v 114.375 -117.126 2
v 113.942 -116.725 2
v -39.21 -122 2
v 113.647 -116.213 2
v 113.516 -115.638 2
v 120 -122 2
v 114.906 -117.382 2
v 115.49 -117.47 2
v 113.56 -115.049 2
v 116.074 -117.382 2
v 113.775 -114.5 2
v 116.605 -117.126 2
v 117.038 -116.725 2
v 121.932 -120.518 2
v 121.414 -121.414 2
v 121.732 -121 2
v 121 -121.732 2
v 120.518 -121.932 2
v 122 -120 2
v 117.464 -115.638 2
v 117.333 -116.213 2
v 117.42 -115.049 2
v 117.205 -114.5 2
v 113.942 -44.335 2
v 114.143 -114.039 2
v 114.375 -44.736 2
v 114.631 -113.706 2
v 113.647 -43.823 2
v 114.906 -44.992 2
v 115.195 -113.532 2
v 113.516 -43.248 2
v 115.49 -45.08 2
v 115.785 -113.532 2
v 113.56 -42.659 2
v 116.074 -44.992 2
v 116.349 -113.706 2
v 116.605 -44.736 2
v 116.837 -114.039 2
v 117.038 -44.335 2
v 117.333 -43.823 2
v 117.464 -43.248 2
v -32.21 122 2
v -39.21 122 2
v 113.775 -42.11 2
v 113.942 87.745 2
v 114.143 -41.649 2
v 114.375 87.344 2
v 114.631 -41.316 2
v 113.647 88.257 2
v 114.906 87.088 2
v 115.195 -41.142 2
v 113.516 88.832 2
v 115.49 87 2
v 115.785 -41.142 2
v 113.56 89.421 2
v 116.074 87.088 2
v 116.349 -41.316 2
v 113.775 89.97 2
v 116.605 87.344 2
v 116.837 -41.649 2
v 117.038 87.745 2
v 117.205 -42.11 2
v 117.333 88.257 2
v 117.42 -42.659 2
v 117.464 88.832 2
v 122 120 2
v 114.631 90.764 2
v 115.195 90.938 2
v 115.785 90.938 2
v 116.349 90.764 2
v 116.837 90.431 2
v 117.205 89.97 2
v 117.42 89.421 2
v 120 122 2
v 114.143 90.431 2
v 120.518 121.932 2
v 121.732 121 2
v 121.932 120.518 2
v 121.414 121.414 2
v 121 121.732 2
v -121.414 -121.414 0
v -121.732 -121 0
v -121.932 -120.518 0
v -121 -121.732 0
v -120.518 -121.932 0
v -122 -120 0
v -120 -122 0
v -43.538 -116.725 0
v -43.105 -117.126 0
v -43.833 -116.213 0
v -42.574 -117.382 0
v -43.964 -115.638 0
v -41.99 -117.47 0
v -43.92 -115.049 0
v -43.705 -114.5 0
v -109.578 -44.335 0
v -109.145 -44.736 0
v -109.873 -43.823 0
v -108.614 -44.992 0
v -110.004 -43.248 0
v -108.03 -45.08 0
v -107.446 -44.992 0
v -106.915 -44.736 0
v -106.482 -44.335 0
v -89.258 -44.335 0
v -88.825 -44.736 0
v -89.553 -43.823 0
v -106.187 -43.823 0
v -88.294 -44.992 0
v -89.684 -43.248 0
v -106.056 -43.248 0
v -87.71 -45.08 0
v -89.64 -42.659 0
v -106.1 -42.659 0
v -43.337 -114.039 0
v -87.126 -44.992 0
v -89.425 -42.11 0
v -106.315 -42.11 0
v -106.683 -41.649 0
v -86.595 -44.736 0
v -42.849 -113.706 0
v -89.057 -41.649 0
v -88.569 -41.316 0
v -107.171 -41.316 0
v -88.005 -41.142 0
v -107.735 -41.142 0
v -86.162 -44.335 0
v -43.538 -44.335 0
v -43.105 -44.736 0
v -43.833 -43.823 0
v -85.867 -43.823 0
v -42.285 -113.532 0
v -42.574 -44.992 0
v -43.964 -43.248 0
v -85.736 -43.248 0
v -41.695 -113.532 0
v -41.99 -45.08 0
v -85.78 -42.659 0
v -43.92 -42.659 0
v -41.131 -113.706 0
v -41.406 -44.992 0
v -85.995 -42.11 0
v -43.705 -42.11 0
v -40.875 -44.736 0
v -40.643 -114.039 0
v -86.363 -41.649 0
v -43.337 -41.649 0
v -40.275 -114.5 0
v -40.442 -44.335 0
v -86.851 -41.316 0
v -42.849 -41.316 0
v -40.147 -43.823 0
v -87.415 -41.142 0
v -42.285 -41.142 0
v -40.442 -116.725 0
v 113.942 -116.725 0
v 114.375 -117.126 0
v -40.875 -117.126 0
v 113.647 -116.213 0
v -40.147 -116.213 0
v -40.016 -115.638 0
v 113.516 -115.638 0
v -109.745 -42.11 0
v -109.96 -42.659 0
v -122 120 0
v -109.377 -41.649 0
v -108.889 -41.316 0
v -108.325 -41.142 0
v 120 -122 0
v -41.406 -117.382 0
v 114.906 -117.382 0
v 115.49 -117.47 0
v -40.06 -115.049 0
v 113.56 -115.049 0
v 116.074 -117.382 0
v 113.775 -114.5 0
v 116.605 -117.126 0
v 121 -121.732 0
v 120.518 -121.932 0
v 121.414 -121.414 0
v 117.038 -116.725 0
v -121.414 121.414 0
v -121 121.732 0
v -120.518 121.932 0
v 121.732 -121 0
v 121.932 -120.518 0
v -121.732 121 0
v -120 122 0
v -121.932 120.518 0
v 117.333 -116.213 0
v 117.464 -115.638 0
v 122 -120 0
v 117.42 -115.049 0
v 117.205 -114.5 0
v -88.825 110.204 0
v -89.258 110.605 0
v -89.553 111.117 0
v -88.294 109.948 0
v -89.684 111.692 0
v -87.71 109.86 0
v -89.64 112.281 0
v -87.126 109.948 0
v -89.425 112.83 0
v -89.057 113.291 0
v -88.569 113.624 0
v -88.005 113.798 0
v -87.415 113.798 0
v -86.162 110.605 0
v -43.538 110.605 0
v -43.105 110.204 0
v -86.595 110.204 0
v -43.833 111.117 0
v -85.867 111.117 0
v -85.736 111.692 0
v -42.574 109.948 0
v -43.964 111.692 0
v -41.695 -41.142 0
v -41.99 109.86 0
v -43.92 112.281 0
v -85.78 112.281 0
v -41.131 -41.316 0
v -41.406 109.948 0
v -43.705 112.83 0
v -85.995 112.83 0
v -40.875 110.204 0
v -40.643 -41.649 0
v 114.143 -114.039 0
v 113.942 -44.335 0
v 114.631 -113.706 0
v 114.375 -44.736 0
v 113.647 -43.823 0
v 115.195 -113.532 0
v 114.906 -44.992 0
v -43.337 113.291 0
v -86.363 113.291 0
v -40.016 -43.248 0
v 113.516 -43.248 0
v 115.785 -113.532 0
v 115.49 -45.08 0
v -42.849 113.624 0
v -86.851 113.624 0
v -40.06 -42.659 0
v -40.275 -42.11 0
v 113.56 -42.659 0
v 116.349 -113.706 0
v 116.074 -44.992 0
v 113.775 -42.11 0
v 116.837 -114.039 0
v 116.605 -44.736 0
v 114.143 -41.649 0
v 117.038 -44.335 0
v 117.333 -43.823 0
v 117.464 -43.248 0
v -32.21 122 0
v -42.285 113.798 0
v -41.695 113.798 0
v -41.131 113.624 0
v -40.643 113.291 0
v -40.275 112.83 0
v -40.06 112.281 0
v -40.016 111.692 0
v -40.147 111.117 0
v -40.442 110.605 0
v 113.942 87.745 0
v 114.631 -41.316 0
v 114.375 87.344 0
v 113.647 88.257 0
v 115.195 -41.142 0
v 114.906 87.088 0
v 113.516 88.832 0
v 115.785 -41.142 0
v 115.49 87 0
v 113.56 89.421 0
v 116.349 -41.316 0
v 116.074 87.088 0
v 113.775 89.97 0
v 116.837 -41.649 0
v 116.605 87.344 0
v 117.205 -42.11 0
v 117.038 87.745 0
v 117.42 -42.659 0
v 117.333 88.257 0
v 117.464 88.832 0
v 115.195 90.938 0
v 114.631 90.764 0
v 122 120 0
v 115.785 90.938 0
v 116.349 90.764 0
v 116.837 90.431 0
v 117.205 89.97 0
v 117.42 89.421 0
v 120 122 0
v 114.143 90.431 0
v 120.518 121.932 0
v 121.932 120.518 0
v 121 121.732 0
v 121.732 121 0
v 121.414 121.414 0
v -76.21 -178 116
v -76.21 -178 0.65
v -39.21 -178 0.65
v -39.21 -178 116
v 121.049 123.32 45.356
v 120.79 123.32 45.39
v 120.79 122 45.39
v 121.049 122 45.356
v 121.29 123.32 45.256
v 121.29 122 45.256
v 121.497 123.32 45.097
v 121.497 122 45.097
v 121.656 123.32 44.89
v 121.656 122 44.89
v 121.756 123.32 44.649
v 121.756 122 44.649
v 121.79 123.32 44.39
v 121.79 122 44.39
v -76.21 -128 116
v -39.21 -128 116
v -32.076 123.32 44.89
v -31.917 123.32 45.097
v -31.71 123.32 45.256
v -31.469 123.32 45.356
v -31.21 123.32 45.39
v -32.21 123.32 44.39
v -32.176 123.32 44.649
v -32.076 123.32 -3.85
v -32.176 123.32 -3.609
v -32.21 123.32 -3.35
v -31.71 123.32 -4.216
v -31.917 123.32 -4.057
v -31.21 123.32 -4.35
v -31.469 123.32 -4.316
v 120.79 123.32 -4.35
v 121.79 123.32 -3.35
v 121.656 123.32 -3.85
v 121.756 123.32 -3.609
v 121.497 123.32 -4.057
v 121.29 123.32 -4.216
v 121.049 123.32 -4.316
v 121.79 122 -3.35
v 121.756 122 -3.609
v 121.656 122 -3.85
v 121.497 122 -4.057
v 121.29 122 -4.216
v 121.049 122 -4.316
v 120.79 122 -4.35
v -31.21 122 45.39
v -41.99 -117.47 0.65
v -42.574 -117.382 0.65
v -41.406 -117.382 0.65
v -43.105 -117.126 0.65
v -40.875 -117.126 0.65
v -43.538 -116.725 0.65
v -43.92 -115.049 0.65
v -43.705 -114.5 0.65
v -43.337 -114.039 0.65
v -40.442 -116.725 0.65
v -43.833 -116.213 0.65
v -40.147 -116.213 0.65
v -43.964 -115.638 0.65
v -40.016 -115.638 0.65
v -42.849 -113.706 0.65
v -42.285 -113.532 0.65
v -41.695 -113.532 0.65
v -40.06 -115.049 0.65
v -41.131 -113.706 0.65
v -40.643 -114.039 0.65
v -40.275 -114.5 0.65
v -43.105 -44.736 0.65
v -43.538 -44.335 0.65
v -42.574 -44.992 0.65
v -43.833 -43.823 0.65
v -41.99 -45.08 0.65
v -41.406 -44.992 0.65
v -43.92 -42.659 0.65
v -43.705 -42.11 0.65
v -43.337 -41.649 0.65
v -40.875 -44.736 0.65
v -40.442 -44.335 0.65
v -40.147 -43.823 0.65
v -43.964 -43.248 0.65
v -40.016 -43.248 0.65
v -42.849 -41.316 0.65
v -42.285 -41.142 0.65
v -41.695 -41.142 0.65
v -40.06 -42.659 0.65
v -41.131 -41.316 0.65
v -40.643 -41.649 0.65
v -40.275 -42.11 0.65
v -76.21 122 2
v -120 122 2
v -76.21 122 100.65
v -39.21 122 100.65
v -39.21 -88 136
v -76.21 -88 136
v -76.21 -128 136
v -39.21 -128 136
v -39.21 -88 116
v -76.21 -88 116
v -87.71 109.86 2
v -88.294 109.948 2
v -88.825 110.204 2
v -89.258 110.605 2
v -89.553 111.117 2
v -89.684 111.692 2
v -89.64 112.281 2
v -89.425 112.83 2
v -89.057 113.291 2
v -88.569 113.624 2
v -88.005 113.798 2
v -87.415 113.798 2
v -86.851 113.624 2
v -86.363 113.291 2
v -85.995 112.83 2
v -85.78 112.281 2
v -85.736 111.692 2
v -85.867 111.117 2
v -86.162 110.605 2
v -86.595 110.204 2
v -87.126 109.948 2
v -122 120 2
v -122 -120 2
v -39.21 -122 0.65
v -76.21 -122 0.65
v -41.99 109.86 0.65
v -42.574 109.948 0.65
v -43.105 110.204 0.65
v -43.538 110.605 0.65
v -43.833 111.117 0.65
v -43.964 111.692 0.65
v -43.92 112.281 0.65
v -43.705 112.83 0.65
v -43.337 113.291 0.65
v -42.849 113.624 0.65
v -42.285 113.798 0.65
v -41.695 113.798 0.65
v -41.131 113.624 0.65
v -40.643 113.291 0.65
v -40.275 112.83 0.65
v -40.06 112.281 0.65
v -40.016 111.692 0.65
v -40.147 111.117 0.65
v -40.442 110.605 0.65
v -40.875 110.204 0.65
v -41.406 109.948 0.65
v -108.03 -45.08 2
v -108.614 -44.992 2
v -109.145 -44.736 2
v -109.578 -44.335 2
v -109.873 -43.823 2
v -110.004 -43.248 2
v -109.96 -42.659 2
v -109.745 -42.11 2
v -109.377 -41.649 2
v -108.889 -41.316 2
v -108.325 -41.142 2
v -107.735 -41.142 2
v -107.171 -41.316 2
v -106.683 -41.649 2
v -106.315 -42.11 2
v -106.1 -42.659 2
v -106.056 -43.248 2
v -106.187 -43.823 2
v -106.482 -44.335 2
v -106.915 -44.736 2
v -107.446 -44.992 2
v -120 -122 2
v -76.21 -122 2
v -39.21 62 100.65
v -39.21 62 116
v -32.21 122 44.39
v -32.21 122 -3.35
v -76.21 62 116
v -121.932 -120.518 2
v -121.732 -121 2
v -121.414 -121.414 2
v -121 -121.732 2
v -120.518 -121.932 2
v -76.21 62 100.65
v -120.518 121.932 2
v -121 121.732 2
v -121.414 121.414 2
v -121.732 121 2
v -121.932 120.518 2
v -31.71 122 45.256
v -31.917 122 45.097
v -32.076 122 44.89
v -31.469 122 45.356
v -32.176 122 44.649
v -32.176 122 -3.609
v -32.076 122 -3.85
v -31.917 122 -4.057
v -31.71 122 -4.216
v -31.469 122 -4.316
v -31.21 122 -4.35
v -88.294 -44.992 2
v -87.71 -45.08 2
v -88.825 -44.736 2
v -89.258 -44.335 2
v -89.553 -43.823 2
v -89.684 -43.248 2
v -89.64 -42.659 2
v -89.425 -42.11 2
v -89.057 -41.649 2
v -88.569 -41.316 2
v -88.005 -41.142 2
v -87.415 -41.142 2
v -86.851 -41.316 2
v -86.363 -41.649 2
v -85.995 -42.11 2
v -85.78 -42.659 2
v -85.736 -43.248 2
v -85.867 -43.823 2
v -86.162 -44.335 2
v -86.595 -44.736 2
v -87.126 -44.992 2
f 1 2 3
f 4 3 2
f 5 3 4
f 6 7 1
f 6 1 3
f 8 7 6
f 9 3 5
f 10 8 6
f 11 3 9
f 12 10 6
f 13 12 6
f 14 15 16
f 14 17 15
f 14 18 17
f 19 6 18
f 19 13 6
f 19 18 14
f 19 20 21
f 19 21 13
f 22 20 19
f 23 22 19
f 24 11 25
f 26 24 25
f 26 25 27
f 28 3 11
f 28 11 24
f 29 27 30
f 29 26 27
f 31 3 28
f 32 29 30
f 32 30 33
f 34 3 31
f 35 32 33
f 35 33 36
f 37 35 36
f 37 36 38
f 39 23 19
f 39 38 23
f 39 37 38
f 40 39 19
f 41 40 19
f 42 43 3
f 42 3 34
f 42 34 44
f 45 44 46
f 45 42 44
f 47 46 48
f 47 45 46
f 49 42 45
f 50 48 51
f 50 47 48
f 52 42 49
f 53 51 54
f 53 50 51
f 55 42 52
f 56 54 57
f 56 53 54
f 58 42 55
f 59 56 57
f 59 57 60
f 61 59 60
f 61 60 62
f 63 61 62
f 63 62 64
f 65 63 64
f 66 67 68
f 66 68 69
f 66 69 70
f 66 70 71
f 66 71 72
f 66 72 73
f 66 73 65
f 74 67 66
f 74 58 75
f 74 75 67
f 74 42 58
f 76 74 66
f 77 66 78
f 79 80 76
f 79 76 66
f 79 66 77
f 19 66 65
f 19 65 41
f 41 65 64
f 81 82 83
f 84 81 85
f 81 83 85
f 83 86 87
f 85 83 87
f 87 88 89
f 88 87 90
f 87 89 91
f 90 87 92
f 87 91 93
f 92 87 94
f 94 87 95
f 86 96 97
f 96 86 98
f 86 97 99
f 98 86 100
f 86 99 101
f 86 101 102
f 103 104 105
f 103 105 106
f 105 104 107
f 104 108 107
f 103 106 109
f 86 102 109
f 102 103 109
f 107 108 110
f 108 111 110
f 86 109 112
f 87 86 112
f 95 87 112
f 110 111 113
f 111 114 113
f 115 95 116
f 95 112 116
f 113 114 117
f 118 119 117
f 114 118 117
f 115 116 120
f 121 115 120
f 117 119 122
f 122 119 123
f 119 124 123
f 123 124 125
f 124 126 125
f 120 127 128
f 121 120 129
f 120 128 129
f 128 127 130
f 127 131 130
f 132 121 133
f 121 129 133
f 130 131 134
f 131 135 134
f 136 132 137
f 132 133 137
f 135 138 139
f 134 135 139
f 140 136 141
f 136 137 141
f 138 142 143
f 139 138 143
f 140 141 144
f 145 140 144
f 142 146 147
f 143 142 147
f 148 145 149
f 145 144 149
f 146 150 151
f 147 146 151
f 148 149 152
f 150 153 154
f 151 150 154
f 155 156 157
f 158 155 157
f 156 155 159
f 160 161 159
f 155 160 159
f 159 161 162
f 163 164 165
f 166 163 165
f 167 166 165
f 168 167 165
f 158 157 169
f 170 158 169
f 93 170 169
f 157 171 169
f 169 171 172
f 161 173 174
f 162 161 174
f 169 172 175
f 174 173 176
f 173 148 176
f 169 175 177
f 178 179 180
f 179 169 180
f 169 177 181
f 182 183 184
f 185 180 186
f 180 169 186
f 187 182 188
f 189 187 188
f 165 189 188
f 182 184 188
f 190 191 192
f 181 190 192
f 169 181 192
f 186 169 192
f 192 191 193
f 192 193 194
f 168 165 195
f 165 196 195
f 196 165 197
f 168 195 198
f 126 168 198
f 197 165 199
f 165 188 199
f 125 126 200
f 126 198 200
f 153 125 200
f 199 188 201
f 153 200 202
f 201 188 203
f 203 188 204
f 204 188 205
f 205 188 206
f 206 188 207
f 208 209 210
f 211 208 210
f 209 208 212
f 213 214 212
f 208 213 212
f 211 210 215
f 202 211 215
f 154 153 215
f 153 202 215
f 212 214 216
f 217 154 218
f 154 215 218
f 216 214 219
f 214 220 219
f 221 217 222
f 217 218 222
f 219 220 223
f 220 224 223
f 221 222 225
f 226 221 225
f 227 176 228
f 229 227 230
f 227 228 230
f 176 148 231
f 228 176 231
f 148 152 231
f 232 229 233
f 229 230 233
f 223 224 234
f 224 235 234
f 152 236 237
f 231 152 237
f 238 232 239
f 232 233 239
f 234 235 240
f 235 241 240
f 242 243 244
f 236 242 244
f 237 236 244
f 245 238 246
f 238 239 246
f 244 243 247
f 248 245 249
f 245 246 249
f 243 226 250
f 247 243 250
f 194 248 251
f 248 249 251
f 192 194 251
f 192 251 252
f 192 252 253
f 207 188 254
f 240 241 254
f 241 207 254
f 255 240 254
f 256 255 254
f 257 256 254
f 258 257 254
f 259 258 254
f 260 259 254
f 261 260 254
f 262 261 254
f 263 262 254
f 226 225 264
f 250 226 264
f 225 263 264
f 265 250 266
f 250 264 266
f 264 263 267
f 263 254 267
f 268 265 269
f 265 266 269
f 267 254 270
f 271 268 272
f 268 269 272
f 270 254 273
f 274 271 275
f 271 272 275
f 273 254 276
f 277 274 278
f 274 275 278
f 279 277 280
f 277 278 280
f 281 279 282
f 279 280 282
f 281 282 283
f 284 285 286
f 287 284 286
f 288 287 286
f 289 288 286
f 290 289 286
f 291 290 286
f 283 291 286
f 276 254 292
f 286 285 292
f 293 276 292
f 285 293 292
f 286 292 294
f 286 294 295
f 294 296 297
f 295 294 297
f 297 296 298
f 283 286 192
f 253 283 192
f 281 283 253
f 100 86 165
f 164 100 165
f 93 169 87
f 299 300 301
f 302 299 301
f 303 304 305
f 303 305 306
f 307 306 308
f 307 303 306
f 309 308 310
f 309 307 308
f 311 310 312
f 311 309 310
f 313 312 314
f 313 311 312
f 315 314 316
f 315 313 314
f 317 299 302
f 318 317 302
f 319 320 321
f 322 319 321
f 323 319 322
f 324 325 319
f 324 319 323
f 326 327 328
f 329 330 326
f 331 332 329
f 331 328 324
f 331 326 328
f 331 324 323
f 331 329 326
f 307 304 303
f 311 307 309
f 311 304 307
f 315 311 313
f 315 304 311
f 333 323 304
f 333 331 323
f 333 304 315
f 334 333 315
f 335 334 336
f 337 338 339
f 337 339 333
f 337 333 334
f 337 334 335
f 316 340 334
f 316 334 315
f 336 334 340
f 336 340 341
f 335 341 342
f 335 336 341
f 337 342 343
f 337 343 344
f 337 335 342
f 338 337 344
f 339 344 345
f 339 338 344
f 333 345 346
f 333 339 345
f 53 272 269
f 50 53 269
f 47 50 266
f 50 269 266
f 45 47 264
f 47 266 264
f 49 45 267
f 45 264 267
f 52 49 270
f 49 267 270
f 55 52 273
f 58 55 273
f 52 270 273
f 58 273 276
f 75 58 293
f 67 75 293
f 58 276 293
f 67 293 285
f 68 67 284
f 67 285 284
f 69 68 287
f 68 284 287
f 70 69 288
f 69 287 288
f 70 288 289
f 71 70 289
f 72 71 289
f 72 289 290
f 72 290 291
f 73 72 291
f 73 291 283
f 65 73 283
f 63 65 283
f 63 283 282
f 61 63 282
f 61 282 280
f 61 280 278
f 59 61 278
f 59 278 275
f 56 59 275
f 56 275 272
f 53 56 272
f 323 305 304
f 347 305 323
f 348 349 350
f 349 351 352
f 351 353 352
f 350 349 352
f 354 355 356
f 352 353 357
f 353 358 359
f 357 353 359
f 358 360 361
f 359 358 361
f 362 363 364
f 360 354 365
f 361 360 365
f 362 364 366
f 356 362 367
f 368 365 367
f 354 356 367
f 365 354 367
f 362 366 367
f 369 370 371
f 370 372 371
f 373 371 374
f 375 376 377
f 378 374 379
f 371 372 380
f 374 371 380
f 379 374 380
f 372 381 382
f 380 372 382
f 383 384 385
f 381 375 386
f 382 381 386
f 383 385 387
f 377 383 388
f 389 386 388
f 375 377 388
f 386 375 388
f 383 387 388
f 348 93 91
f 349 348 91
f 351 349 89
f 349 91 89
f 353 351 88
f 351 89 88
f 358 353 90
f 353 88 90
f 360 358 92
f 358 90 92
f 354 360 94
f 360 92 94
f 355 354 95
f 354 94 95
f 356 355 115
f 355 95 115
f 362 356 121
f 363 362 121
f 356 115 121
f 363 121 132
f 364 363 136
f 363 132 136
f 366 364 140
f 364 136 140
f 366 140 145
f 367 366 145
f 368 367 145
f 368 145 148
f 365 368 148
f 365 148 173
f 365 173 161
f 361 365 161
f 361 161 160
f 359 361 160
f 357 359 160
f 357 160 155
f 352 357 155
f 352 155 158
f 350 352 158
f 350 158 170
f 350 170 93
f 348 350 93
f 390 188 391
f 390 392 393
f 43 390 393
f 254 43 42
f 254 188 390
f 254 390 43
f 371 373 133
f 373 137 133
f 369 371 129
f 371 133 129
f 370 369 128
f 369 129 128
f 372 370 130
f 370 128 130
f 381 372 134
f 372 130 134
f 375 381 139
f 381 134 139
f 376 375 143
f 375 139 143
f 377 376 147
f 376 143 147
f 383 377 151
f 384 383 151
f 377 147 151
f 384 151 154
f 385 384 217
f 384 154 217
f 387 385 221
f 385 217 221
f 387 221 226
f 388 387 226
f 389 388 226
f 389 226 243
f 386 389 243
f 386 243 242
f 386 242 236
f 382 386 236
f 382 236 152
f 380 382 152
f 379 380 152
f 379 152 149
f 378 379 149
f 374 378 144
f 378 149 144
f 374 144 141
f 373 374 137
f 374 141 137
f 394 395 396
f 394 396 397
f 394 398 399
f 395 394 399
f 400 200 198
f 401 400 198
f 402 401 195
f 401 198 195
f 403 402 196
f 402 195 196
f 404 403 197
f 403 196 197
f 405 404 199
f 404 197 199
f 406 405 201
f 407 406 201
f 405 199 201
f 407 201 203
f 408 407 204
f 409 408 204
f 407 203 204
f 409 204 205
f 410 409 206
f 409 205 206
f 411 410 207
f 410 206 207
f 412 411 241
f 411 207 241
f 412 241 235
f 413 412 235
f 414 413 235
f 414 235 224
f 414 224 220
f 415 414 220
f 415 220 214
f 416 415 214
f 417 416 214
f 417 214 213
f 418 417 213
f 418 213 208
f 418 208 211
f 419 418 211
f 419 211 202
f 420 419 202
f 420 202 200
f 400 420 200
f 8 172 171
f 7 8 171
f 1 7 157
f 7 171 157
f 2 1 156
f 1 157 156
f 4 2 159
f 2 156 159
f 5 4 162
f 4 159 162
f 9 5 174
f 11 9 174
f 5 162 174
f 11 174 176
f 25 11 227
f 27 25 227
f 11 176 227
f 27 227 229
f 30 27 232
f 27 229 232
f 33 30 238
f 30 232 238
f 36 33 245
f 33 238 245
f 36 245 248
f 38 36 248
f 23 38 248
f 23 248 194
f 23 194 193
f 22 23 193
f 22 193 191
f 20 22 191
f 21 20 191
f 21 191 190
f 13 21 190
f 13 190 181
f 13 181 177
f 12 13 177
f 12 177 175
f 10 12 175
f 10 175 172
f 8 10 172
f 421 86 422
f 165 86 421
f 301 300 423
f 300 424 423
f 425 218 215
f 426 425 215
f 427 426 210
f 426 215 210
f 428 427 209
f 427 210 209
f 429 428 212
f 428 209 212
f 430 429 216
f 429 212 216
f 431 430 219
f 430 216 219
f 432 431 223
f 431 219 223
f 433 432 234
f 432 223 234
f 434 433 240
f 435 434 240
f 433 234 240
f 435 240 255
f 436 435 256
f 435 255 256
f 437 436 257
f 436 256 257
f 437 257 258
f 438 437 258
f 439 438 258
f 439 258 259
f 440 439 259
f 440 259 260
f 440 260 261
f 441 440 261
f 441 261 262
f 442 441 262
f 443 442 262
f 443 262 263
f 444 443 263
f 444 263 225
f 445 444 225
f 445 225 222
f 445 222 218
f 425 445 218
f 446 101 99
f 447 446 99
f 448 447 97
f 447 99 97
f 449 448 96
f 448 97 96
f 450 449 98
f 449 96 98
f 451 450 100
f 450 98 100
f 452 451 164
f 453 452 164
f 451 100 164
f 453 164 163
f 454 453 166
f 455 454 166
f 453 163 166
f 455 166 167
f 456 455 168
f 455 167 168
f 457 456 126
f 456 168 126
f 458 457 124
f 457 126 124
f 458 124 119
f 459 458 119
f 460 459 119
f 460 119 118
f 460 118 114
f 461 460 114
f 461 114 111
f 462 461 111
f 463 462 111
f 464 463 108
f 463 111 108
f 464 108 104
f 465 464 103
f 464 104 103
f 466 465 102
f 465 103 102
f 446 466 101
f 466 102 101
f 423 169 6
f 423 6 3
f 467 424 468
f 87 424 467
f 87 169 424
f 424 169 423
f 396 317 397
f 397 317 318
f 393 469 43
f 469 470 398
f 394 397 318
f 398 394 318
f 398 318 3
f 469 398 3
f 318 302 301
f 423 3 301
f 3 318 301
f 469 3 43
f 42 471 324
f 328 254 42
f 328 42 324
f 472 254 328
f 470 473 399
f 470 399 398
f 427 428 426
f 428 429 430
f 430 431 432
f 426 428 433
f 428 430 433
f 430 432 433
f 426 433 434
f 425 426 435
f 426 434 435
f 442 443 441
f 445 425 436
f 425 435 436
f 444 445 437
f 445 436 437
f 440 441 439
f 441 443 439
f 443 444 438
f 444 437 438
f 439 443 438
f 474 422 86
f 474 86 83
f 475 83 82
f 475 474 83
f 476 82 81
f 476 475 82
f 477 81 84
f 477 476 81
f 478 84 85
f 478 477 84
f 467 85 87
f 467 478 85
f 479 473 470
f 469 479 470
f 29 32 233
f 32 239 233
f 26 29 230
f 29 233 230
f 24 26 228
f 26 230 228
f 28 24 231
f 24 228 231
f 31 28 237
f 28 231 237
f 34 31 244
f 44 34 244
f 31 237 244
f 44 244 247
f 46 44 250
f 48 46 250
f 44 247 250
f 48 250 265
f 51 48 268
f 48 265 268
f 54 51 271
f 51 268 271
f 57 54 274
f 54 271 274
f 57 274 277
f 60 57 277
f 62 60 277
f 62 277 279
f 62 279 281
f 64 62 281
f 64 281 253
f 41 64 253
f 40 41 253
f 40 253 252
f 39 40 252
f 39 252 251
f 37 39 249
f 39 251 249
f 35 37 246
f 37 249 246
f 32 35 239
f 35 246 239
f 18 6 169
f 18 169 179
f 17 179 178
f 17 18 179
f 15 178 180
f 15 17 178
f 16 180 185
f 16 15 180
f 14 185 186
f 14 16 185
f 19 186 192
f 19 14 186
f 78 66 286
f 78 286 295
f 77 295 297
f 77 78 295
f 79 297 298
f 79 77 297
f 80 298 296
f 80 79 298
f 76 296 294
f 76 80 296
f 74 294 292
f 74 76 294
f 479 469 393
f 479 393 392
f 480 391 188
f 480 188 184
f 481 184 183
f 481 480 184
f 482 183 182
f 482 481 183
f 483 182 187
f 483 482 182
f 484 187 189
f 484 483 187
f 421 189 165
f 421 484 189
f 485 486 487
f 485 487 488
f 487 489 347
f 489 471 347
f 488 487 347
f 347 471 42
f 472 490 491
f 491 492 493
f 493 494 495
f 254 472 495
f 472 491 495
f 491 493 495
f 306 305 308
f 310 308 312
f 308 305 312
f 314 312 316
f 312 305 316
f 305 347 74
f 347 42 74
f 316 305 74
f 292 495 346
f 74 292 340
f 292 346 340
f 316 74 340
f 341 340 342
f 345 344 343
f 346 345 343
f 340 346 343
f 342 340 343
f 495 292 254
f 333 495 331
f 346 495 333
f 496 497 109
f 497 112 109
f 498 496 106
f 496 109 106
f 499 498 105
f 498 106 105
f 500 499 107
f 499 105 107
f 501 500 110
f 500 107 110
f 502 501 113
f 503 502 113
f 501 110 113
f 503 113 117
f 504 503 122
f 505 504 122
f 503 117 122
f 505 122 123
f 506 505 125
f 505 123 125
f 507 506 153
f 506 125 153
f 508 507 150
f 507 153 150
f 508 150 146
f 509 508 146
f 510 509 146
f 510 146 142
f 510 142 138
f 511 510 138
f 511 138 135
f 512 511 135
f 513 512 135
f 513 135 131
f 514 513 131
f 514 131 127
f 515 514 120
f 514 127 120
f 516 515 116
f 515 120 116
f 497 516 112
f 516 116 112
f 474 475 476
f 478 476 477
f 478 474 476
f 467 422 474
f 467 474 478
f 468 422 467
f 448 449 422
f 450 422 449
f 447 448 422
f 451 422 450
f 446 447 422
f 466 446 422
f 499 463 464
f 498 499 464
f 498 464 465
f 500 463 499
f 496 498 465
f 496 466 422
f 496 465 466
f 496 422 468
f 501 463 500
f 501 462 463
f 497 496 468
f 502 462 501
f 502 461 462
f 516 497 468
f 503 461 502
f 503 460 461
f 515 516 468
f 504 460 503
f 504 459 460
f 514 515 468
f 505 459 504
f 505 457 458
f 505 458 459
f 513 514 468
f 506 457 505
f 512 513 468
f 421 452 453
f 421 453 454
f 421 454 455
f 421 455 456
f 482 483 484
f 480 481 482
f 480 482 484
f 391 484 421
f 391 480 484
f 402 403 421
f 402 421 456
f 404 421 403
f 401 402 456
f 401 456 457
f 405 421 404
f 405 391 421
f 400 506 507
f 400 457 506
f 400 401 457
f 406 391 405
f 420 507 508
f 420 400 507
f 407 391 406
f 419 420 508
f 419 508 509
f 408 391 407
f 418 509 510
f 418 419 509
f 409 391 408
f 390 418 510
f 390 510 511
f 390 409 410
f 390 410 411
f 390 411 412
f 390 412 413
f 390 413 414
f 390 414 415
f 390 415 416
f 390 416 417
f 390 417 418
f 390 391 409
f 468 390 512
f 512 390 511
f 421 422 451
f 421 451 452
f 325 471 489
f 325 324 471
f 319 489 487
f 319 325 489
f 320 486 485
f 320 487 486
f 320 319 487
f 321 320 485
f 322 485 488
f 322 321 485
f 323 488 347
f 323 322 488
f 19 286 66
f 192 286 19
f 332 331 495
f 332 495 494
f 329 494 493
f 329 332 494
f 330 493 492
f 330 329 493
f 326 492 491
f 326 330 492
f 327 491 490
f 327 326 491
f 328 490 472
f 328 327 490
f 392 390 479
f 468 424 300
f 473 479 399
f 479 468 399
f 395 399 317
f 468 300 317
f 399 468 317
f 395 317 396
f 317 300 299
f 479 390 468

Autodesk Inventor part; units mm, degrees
ref_plane "YZ Plane" through (0, 0, 0) normal (1, 0, 0) x (0, 1, 0)
ref_plane "XZ Plane" through (0, 0, 0) normal (0, 1, 0) x (-1, 0, 0)
ref_plane "XY Plane" through (0, 0, 0) normal (0, 0, 1) x (1, 0, 0)
sketch "Sketch1" plane through (0, 0, 0) normal (0, 0, 1) x (1, 0, 0)
  line L0 (-122, 122) -> (122, 122)
  line L1 (122, 122) -> (122, -122)
  line L2 (122, -122) -> (-122, -122)
  line L3 (-122, -122) -> (-122, 122)
  point P0 (0, 0)
  dimension "d0" = 244
  dimension "d1" = 244
  dimension "d2" = 122
  dimension "d3" = 122
extrude "Extrusion1" add sketch "Sketch1" along normal blind 2
sketch "Sketch3" plane through (0, 0, 2) normal (0, 0, 1) x (1, 0, 0)
  line L0 (122, 122) -> (-122, 122) projected
  line L1 (-122, 122) -> (-122, -122) projected
  line L2 (-122, -122) -> (122, -122) projected
  line L3 (122, -122) -> (122, 122) projected
  line L4 (-209.7818, 111.84) -> (205.7988, 111.84) construction
  line L5 (-179.0523, -43.1) -> (193.3606, -43.1) construction
  line L6 (-192.2221, -115.49) -> (227.0168, -115.49) construction
  line L7 (115.49, -184.6971) -> (115.49, 232.3468) construction
  line L8 (-41.99, -199.0105) -> (-41.99, 288.2767) construction
  point P0 (0, 0)
  point P1 (-87.71, 111.84)
  point P2 (-41.99, 111.84)
  point P3 (-108.03, -43.1)
  point P4 (-87.71, -43.1)
  point P5 (-41.99, -43.1)
  point P6 (115.49, -43.1)
  point P7 (115.49, -115.49)
  point P8 (-41.99, -115.49)
  point P9 (115.49, 88.98)
  dimension "d12" = 34.29
  dimension "d13" = 20.32
  dimension "d18" = 10.16
  dimension "d20" = 227.33
  dimension "d22" = 90
  dimension "d23" = 22.86
  dimension "d24" = 154.94
  dimension "d25" = 45.72
  dimension "d26" = 203.2
  dimension "d27" = 45.72
hole "Hole1" at (-87.71, 111.84, 2) at (-41.99, 111.84, 2) at (-108.03, -43.1, 2) at (-87.71, -43.1, 2) at (-41.99, -43.1, 2) at (115.49, -43.1, 2) at (115.49, -115.49, 2) at (-41.99, -115.49, 2) at (115.49, 88.98, 2) direction (0, 0, -1) diameter 3.96 end through all
fillet "Fillet1" radius 2 4 edges at (-122, 122, 1) (-122, -122, 1) (122, -122, 1) (122, 122, 1)
sketch "Sketch4" plane through (-120, 122, 0) normal (0, 1, 0) x (1, 0, 0)
  line L0 (34.27, -2) -> (30.31, -2) construction
  line L1 (32.29, -21.9524) -> (32.29, 25.1381) construction
  line L2 (241.79, -45.39) -> (87.79, -45.39)
  line L3 (87.79, -45.39) -> (87.79, 4.35)
  line L4 (87.79, 4.35) -> (241.79, 4.35)
  line L5 (241.79, 4.35) -> (241.79, -45.39)
  line L6 (240, -2) -> (0, -2) construction
  line L7 (34.27, -2) -> (30.31, -2) construction
  point P0 (120, 0)
  point P1 (32.29, -2)
  dimension "d36" = 154
  dimension "d37" = 49.74
  dimension "d38" = 55.5
  dimension "d39" = 6.35
extrude "Extrusion3" add sketch "Sketch4" along normal blind 1.32
fillet "Fillet2" radius 1 4 edges at (121.79, 122.66, 45.39) (-32.21, 122.66, 45.39) (121.79, 122.66, -4.35) (-32.21, 122.66, -4.35)
sketch "Sketch5" plane through (-120, 122, 2) normal (0, 1, 0) x (1, 0, 0)
  line L0 (80.79, -98.65) -> (43.79, -98.65)
  line L1 (43.79, -98.65) -> (43.79, 1.35)
  line L2 (43.79, 1.35) -> (80.79, 1.35)
  line L3 (80.79, 1.35) -> (80.79, -98.65)
  line L4 (87.79, 5.35) -> (87.79, -42.39) projected
  line L5 (240.79, 6.35) -> (88.79, 6.35) projected
  point P0 (120, 2)
  dimension "d43" = 37
  dimension "d44" = 100
  dimension "d45" = 7
  dimension "d46" = 5
extrude "Extrusion4" add sketch "Sketch5" against normal blind 300
sketch "Sketch7" plane through (-120, -178, 2) normal (0, -1, 0) x (1, 0, 0)
  line L0 (43.79, 114) -> (80.79, 114)
  line L1 (80.79, 114) -> (80.79, 0)
  line L2 (80.79, 0) -> (43.79, 0)
  line L3 (43.79, 0) -> (43.79, 114)
  point P0 (120, -2)
  dimension "d49" = 37
  dimension "d50" = 114
extrude "Extrusion5" add sketch "Sketch7" against normal blind 240
sketch "Sketch8" plane through (-76.21, -178, 116) normal (0, 0, 1) x (1, 0, 0)
  line L0 (37, 0) -> (37, 240) projected
  line L1 (0, 0) -> (0, 240) projected
  line L2 (37, 90) -> (0, 90)
  line L3 (0, 90) -> (0, 50)
  line L4 (0, 50) -> (37, 50)
  line L5 (37, 50) -> (37, 90)
  line L6 (0, 0) -> (37, 0) projected
  point P0 (76.21, 178)
  dimension "d53" = 50
  dimension "d54" = 40
extrude "Extrusion6" add sketch "Sketch8" along normal blind 20 contours L4 L1 L2 L0
properties part number "Mobo"
